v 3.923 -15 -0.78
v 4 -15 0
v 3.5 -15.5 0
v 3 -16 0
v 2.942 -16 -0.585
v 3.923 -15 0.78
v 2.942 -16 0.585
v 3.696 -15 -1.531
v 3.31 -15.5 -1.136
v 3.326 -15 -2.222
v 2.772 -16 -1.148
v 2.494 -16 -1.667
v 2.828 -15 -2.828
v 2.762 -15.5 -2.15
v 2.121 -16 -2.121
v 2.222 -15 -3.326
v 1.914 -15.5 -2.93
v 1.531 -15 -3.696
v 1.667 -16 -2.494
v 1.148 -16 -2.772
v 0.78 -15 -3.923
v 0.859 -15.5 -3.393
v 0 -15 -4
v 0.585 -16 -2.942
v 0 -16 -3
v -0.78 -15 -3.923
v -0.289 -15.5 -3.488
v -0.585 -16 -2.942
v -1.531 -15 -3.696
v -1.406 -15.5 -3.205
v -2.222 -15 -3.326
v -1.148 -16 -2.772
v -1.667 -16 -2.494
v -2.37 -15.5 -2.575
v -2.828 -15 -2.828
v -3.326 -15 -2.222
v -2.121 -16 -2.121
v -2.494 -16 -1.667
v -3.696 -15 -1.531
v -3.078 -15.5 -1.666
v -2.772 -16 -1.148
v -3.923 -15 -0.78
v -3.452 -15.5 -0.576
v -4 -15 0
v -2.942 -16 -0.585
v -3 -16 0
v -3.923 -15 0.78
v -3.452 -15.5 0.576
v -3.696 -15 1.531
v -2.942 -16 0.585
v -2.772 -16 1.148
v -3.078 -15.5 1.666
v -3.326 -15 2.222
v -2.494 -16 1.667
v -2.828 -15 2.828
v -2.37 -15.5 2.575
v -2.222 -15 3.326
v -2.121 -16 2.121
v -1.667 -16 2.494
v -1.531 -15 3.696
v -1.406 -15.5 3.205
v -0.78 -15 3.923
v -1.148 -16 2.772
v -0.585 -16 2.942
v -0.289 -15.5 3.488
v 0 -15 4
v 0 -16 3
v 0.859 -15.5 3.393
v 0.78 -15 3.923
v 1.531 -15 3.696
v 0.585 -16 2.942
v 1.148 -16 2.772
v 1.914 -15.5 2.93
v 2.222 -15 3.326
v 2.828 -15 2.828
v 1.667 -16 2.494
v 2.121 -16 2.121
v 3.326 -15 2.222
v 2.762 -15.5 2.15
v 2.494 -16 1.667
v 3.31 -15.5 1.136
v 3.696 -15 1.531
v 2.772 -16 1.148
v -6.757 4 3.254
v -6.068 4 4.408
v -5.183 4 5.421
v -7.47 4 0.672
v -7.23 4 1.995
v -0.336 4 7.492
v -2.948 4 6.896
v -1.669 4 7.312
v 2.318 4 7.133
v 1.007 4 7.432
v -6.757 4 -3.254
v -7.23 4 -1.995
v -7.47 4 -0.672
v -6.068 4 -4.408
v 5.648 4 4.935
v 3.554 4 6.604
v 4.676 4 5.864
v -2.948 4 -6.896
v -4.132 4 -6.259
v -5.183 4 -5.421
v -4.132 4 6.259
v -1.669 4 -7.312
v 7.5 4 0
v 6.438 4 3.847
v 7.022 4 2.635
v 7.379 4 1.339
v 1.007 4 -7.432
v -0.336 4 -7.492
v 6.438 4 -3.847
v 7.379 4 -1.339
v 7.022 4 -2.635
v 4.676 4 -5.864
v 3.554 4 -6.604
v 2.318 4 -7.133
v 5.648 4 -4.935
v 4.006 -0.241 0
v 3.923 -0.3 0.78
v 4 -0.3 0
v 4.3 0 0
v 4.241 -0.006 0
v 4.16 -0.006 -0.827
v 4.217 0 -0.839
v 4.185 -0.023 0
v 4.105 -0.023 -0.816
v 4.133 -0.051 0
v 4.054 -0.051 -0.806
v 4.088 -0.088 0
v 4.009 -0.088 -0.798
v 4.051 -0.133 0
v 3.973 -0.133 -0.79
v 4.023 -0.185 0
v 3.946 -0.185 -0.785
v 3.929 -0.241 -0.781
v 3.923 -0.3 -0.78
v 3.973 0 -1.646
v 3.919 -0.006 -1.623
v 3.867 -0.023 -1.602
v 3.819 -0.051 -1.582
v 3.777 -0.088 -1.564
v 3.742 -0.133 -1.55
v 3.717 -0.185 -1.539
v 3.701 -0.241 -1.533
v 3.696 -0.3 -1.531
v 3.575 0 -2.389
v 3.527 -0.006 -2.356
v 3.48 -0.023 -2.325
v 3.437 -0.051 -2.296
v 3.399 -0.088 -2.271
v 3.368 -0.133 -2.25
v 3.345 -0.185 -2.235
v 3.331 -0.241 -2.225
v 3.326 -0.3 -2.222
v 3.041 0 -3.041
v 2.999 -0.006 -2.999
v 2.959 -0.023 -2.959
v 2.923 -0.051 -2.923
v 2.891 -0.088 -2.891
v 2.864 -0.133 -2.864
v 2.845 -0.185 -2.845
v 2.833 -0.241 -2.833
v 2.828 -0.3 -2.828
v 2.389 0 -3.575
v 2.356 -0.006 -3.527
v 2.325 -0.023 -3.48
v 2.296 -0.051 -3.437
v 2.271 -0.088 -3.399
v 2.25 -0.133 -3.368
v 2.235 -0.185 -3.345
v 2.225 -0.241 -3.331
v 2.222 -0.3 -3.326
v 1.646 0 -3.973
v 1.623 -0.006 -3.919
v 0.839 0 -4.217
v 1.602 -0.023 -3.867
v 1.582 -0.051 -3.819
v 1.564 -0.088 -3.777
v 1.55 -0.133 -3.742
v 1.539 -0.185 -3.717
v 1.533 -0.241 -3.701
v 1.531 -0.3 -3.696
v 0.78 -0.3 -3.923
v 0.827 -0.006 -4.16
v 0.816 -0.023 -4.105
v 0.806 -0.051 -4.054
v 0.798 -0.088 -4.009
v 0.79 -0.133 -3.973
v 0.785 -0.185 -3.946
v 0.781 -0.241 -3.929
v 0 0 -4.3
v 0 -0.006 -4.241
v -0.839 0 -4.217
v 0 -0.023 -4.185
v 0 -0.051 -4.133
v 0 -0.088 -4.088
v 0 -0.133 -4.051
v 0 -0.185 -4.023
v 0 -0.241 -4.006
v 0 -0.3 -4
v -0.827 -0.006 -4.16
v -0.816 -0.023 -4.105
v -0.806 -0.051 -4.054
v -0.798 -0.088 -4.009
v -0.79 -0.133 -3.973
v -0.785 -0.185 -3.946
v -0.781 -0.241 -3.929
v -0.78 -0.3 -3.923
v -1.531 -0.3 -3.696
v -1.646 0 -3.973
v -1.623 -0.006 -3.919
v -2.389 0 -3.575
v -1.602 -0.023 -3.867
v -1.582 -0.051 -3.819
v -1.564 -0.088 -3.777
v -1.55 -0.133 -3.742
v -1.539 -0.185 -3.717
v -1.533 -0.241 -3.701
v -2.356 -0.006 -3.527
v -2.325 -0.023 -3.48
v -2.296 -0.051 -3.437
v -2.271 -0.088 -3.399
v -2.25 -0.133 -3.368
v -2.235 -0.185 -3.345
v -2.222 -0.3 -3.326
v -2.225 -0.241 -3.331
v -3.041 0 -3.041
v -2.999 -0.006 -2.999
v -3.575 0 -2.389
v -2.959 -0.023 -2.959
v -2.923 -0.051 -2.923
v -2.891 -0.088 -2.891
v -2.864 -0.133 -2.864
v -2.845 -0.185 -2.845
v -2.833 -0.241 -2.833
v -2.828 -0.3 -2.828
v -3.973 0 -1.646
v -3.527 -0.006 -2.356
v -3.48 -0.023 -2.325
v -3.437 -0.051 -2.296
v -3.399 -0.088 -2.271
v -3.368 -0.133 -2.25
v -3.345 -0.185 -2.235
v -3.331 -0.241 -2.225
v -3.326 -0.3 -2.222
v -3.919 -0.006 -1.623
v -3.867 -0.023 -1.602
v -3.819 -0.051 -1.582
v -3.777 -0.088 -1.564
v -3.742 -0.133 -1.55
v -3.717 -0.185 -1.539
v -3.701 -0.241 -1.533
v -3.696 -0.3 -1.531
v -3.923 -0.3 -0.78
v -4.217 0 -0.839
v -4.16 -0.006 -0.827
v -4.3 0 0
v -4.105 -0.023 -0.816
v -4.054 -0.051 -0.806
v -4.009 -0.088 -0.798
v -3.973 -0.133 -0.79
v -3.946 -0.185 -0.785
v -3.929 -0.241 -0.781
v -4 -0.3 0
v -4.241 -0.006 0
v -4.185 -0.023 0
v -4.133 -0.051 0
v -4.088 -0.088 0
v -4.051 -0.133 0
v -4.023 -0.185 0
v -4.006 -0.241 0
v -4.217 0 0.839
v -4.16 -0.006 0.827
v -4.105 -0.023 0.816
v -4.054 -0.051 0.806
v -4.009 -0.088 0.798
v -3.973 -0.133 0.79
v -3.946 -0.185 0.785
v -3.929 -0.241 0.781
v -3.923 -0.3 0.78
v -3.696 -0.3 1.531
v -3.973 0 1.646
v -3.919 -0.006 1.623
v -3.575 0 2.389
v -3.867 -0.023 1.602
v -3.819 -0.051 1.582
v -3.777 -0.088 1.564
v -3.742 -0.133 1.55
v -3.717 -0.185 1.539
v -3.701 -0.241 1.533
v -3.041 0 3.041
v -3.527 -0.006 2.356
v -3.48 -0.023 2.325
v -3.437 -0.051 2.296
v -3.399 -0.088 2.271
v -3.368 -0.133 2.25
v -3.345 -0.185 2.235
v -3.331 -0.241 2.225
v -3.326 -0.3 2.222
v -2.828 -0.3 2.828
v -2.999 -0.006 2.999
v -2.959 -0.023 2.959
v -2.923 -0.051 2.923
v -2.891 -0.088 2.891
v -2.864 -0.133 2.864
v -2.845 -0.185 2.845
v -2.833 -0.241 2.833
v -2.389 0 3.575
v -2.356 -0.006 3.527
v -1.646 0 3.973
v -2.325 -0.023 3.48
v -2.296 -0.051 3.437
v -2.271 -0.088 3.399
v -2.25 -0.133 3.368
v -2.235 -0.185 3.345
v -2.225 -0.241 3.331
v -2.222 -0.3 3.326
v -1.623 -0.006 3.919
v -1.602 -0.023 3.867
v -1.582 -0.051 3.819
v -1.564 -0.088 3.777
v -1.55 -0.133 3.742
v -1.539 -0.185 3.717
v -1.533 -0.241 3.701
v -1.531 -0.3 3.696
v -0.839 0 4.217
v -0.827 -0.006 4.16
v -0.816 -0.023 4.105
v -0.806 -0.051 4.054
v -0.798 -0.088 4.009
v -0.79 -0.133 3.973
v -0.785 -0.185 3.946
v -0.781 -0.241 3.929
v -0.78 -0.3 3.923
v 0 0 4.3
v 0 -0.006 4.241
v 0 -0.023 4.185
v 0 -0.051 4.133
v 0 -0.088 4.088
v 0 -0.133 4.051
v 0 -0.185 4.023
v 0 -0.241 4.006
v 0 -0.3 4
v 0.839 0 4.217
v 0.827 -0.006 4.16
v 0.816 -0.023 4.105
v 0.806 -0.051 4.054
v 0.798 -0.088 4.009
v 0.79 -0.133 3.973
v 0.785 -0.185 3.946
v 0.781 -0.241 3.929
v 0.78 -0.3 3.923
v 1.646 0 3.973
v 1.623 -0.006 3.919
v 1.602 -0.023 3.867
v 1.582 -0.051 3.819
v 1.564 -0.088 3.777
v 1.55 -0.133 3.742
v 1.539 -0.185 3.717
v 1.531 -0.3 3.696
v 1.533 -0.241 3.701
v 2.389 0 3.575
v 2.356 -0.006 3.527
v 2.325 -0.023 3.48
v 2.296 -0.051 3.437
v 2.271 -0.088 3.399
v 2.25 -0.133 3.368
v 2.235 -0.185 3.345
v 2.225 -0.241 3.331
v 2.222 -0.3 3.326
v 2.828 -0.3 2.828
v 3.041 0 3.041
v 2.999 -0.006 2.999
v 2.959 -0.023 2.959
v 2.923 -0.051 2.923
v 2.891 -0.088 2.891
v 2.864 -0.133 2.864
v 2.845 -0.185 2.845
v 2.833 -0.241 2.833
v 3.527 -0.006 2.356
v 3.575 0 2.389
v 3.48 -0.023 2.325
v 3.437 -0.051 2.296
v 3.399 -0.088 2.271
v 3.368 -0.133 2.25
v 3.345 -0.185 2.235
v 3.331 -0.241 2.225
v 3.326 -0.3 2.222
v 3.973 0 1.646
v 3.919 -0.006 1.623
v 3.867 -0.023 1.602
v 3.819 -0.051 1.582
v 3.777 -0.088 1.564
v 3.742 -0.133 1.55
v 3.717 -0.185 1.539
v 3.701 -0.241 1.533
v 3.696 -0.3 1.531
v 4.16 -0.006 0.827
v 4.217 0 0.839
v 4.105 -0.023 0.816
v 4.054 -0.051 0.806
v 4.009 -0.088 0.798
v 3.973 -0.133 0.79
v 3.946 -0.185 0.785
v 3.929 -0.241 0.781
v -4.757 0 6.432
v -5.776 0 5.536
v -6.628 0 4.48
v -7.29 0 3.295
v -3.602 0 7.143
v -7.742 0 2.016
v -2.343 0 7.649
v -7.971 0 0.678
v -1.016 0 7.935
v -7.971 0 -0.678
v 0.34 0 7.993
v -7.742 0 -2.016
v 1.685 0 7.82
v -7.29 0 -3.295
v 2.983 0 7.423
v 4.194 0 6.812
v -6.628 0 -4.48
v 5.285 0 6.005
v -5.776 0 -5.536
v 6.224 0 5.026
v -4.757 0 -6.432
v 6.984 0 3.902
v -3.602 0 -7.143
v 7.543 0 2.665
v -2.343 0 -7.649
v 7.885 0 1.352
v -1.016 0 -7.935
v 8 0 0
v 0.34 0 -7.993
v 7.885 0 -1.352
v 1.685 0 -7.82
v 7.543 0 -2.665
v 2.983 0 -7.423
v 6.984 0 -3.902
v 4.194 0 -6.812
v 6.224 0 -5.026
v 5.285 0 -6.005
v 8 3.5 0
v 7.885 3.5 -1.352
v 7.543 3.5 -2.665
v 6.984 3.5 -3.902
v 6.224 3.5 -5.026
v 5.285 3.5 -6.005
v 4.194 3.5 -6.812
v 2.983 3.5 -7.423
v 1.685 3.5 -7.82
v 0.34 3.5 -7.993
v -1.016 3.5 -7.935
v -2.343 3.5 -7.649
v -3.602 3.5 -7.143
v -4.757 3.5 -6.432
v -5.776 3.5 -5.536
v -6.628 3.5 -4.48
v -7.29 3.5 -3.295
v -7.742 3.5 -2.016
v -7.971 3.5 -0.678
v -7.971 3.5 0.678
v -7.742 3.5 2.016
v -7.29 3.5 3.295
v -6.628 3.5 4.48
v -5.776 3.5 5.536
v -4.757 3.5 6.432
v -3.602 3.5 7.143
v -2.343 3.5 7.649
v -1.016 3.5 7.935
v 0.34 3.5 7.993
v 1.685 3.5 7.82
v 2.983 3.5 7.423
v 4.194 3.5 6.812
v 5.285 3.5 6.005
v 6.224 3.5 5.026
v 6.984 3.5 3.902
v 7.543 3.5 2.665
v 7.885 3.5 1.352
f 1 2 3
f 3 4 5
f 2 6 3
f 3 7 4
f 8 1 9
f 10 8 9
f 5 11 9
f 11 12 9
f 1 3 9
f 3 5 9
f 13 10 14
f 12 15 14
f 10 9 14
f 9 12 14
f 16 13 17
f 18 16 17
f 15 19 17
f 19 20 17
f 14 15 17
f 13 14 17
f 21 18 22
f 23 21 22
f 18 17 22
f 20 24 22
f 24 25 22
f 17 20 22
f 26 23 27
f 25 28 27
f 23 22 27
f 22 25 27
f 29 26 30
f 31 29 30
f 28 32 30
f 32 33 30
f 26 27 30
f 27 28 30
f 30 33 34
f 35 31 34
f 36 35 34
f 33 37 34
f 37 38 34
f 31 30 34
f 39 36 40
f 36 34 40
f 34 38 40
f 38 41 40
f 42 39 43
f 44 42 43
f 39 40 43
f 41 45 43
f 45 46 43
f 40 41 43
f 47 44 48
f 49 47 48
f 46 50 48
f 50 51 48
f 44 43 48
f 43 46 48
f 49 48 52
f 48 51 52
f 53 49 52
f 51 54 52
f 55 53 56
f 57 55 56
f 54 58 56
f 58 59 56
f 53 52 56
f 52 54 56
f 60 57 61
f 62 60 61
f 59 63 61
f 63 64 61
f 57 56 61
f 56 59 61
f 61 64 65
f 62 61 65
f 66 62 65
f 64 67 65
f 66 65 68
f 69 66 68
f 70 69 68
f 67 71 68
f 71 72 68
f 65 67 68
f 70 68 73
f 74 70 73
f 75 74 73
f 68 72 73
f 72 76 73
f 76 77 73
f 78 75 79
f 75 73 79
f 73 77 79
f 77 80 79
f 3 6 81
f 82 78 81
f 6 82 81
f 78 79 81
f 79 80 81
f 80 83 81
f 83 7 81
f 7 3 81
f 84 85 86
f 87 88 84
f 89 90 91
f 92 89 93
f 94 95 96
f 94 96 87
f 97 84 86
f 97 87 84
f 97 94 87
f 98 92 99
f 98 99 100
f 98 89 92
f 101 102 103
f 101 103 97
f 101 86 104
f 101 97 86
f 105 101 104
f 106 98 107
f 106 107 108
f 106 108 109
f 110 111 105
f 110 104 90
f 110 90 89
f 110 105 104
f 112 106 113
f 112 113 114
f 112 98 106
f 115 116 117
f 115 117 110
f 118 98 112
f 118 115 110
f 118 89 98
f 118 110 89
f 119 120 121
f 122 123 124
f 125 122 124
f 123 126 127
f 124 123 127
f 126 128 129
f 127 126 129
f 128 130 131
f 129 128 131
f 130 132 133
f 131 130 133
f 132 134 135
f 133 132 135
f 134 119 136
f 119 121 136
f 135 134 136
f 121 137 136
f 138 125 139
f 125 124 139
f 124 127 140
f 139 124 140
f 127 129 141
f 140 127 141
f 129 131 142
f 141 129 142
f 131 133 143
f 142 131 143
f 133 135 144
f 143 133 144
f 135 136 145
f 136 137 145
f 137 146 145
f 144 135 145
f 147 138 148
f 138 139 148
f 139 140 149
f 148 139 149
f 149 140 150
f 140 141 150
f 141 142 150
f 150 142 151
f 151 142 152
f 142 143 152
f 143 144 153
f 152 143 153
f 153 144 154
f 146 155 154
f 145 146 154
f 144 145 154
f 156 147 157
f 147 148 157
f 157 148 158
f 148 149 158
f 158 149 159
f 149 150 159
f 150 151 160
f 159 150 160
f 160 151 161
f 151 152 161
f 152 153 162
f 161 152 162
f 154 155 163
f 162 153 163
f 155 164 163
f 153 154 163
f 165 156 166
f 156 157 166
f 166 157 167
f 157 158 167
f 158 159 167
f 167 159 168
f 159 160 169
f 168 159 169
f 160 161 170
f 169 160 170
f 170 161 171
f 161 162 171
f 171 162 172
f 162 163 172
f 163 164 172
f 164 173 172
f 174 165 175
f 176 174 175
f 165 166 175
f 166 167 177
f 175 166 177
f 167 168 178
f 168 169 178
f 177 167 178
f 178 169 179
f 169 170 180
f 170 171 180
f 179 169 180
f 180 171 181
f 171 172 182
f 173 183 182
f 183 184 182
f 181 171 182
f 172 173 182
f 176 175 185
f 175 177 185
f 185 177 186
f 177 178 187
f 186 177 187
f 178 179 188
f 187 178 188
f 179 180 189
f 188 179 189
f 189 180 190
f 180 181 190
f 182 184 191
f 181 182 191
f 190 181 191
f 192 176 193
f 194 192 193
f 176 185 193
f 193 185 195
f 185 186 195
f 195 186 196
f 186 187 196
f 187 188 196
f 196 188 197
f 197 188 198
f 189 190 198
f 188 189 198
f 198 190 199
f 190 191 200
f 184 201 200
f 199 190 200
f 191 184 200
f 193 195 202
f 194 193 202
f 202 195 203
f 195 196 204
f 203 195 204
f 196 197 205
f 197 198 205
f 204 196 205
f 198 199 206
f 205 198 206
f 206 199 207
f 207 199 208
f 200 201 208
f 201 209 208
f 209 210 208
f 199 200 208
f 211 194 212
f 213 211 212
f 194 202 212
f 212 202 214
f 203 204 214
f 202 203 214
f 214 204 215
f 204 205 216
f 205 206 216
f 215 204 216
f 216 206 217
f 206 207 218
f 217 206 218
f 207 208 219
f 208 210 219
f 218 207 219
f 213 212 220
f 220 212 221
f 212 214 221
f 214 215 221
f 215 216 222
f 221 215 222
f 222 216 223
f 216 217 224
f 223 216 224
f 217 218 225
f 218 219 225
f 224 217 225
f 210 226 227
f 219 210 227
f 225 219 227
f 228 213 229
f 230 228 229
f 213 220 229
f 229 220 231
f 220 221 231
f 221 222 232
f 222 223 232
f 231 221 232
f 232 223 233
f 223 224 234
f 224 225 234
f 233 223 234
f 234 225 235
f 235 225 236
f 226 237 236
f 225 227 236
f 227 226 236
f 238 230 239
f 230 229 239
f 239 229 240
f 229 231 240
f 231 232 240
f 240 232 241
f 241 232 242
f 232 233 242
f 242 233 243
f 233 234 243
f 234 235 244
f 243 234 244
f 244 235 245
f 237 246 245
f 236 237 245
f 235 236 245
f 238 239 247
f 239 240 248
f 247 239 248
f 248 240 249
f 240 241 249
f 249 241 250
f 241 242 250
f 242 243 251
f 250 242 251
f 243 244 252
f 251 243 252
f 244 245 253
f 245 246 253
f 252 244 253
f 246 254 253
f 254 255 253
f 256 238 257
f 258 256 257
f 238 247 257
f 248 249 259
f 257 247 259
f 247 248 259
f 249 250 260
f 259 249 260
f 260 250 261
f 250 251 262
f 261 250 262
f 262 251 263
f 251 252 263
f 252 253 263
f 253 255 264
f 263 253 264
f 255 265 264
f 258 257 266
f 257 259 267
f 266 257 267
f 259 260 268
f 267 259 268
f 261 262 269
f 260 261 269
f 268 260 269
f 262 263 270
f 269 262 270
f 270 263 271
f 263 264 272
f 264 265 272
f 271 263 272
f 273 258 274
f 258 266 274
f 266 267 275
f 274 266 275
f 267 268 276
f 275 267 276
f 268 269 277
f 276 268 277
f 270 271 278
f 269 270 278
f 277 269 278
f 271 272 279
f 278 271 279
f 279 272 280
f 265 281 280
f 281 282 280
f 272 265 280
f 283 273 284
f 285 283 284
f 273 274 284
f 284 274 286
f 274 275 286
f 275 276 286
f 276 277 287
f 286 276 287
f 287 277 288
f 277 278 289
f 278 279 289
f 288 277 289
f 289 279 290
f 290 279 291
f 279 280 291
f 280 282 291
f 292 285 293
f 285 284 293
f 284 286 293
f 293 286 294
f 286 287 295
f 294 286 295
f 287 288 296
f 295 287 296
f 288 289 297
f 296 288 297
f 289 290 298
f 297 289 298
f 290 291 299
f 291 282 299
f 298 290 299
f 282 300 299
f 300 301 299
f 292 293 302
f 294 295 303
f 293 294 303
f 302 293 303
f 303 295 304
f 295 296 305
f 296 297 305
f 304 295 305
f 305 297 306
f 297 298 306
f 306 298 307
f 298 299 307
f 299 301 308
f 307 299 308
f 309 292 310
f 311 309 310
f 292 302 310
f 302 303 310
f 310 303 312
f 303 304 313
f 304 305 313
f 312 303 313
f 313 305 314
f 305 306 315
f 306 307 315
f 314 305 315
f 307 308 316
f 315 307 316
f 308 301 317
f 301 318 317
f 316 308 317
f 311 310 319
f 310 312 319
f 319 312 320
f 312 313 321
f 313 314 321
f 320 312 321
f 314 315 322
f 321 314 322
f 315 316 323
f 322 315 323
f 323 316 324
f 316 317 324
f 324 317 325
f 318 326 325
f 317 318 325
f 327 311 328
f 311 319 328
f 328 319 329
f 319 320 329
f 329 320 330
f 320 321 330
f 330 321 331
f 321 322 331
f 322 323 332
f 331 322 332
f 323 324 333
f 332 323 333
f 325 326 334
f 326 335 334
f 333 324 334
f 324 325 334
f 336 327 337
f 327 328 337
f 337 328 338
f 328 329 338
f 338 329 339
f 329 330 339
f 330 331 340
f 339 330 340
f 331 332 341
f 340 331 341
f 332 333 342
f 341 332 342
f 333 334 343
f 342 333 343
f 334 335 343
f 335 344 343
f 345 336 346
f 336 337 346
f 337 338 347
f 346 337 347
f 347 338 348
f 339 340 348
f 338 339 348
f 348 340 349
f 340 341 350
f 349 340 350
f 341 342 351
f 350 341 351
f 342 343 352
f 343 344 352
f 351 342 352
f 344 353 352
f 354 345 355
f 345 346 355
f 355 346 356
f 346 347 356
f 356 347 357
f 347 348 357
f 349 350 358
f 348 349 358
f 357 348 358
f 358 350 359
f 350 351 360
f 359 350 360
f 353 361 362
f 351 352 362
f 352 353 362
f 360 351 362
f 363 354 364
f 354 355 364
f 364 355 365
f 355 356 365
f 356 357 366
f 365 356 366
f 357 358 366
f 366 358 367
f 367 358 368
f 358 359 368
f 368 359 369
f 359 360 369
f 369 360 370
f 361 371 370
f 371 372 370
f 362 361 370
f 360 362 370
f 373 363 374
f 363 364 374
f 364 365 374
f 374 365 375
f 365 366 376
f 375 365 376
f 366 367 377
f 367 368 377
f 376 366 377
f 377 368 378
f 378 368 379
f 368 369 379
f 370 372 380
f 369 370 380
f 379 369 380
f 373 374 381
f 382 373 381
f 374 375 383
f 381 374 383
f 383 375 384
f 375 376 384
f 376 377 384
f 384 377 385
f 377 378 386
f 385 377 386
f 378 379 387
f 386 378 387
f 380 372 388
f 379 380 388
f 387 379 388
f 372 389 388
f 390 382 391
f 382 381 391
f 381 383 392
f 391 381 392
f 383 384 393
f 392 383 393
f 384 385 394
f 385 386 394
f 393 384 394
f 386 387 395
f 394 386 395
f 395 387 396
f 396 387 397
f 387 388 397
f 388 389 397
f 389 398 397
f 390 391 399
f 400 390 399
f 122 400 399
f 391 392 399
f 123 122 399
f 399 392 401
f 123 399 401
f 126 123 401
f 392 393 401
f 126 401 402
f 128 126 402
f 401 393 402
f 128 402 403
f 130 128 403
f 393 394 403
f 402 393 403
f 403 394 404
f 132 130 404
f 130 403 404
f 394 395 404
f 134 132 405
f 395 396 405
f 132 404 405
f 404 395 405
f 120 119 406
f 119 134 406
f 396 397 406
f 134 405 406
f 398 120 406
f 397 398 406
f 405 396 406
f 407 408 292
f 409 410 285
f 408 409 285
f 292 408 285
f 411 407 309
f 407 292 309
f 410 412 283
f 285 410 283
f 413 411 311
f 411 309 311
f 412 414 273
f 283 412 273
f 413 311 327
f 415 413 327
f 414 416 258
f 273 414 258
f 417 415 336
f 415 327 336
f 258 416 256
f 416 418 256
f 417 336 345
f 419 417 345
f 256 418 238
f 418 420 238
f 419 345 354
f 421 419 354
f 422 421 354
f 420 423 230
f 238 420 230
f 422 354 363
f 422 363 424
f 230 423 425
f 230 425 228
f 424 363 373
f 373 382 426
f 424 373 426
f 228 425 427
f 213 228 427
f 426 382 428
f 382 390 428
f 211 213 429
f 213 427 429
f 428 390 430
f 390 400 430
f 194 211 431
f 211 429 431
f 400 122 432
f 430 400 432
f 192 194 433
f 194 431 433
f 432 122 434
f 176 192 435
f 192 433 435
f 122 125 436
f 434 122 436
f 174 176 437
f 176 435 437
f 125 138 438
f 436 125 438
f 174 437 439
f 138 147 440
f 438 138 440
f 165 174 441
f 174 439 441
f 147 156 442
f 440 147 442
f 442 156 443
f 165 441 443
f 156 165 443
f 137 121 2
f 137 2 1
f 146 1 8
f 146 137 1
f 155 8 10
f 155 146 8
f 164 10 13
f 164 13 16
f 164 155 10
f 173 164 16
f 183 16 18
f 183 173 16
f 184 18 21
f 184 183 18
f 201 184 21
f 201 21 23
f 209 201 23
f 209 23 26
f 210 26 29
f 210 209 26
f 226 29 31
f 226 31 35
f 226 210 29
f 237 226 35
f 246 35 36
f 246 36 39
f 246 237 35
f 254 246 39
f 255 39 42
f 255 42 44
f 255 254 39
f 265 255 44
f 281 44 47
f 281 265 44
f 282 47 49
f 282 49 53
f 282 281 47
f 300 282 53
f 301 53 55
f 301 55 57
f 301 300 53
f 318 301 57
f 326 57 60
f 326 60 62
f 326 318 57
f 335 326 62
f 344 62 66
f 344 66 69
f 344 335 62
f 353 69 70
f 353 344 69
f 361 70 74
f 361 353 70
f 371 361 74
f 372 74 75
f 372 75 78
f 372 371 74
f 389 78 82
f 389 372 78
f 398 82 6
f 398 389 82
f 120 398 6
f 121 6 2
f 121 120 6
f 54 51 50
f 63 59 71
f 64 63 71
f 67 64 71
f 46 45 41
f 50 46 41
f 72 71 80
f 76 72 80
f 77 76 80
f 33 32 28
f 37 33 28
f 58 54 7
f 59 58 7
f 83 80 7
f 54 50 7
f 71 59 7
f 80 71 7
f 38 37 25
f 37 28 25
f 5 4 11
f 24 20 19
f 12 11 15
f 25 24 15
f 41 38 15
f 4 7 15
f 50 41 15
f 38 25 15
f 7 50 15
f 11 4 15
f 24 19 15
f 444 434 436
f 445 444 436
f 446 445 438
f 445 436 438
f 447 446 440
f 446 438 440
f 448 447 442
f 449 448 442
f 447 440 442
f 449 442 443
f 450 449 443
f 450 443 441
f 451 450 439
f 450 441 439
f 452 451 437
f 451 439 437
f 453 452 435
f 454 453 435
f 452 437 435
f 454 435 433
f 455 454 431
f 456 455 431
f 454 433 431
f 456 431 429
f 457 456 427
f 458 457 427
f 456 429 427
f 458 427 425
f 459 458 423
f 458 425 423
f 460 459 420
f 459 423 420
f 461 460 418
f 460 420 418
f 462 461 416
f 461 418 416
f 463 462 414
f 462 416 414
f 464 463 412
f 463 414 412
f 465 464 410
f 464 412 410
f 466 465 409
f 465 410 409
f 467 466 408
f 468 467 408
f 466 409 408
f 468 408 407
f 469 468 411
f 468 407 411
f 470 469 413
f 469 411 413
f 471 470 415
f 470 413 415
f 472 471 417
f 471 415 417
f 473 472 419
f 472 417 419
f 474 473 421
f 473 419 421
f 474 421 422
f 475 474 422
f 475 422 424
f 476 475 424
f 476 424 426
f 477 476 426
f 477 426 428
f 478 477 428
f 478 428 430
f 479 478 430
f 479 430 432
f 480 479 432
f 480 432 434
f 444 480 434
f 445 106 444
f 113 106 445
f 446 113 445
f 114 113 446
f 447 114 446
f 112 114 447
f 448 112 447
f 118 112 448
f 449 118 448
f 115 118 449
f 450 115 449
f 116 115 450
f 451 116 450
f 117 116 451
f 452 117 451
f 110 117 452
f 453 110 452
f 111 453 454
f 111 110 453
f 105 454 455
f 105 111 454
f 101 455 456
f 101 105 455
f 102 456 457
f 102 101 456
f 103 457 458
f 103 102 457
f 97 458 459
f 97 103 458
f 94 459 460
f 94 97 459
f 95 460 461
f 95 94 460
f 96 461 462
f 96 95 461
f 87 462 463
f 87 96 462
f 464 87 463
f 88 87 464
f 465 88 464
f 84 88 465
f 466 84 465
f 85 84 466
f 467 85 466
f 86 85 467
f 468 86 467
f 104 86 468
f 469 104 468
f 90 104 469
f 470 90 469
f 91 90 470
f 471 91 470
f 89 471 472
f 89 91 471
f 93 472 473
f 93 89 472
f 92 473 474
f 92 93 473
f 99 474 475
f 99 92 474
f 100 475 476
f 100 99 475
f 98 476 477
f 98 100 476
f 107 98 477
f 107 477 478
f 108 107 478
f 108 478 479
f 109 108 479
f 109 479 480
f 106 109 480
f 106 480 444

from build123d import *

# Parameters (mm, degrees)
SKETCH1_R           = 4
BOSS_EXTRUDE1_DEPTH = 16
SKETCH2_R           = 8
BOSS_EXTRUDE2_DEPTH = 4
CHAMFER1_SIZE       = 1
CHAMFER2_SIZE       = 0.5
FILLET1_R           = 0.3


with BuildPart() as part:
    # Sketch1 → Boss-Extrude1 (new body)
    with BuildSketch(Plane(origin=(0, 0, 0), x_dir=(1, 0, 0), z_dir=(0, 1, 0))):
        Circle(SKETCH1_R)
    extrude(amount=-BOSS_EXTRUDE1_DEPTH)

    # Sketch2 → Boss-Extrude2 (add)
    with BuildSketch(Plane(origin=(0, 0, 0), x_dir=(1, 0, 0), z_dir=(0, 1, 0))):
        Circle(SKETCH2_R)
    extrude(amount=BOSS_EXTRUDE2_DEPTH)

    # Chamfer1
    chamfer1_edges = [part.edges().sort_by_distance(p)[0] for p in [
        (-4, -16, 0),
    ]]
    chamfer(chamfer1_edges, length=CHAMFER1_SIZE)

    # Chamfer2
    chamfer2_edges = [part.edges().sort_by_distance(p)[0] for p in [
        (-8, 4, 0),
    ]]
    chamfer(chamfer2_edges, length=CHAMFER2_SIZE)

    # Fillet1
    fillet1_edges = [part.edges().sort_by_distance(p)[0] for p in [
        (-4, 0, 0),
    ]]
    fillet(fillet1_edges, radius=FILLET1_R)


solid = part.part
